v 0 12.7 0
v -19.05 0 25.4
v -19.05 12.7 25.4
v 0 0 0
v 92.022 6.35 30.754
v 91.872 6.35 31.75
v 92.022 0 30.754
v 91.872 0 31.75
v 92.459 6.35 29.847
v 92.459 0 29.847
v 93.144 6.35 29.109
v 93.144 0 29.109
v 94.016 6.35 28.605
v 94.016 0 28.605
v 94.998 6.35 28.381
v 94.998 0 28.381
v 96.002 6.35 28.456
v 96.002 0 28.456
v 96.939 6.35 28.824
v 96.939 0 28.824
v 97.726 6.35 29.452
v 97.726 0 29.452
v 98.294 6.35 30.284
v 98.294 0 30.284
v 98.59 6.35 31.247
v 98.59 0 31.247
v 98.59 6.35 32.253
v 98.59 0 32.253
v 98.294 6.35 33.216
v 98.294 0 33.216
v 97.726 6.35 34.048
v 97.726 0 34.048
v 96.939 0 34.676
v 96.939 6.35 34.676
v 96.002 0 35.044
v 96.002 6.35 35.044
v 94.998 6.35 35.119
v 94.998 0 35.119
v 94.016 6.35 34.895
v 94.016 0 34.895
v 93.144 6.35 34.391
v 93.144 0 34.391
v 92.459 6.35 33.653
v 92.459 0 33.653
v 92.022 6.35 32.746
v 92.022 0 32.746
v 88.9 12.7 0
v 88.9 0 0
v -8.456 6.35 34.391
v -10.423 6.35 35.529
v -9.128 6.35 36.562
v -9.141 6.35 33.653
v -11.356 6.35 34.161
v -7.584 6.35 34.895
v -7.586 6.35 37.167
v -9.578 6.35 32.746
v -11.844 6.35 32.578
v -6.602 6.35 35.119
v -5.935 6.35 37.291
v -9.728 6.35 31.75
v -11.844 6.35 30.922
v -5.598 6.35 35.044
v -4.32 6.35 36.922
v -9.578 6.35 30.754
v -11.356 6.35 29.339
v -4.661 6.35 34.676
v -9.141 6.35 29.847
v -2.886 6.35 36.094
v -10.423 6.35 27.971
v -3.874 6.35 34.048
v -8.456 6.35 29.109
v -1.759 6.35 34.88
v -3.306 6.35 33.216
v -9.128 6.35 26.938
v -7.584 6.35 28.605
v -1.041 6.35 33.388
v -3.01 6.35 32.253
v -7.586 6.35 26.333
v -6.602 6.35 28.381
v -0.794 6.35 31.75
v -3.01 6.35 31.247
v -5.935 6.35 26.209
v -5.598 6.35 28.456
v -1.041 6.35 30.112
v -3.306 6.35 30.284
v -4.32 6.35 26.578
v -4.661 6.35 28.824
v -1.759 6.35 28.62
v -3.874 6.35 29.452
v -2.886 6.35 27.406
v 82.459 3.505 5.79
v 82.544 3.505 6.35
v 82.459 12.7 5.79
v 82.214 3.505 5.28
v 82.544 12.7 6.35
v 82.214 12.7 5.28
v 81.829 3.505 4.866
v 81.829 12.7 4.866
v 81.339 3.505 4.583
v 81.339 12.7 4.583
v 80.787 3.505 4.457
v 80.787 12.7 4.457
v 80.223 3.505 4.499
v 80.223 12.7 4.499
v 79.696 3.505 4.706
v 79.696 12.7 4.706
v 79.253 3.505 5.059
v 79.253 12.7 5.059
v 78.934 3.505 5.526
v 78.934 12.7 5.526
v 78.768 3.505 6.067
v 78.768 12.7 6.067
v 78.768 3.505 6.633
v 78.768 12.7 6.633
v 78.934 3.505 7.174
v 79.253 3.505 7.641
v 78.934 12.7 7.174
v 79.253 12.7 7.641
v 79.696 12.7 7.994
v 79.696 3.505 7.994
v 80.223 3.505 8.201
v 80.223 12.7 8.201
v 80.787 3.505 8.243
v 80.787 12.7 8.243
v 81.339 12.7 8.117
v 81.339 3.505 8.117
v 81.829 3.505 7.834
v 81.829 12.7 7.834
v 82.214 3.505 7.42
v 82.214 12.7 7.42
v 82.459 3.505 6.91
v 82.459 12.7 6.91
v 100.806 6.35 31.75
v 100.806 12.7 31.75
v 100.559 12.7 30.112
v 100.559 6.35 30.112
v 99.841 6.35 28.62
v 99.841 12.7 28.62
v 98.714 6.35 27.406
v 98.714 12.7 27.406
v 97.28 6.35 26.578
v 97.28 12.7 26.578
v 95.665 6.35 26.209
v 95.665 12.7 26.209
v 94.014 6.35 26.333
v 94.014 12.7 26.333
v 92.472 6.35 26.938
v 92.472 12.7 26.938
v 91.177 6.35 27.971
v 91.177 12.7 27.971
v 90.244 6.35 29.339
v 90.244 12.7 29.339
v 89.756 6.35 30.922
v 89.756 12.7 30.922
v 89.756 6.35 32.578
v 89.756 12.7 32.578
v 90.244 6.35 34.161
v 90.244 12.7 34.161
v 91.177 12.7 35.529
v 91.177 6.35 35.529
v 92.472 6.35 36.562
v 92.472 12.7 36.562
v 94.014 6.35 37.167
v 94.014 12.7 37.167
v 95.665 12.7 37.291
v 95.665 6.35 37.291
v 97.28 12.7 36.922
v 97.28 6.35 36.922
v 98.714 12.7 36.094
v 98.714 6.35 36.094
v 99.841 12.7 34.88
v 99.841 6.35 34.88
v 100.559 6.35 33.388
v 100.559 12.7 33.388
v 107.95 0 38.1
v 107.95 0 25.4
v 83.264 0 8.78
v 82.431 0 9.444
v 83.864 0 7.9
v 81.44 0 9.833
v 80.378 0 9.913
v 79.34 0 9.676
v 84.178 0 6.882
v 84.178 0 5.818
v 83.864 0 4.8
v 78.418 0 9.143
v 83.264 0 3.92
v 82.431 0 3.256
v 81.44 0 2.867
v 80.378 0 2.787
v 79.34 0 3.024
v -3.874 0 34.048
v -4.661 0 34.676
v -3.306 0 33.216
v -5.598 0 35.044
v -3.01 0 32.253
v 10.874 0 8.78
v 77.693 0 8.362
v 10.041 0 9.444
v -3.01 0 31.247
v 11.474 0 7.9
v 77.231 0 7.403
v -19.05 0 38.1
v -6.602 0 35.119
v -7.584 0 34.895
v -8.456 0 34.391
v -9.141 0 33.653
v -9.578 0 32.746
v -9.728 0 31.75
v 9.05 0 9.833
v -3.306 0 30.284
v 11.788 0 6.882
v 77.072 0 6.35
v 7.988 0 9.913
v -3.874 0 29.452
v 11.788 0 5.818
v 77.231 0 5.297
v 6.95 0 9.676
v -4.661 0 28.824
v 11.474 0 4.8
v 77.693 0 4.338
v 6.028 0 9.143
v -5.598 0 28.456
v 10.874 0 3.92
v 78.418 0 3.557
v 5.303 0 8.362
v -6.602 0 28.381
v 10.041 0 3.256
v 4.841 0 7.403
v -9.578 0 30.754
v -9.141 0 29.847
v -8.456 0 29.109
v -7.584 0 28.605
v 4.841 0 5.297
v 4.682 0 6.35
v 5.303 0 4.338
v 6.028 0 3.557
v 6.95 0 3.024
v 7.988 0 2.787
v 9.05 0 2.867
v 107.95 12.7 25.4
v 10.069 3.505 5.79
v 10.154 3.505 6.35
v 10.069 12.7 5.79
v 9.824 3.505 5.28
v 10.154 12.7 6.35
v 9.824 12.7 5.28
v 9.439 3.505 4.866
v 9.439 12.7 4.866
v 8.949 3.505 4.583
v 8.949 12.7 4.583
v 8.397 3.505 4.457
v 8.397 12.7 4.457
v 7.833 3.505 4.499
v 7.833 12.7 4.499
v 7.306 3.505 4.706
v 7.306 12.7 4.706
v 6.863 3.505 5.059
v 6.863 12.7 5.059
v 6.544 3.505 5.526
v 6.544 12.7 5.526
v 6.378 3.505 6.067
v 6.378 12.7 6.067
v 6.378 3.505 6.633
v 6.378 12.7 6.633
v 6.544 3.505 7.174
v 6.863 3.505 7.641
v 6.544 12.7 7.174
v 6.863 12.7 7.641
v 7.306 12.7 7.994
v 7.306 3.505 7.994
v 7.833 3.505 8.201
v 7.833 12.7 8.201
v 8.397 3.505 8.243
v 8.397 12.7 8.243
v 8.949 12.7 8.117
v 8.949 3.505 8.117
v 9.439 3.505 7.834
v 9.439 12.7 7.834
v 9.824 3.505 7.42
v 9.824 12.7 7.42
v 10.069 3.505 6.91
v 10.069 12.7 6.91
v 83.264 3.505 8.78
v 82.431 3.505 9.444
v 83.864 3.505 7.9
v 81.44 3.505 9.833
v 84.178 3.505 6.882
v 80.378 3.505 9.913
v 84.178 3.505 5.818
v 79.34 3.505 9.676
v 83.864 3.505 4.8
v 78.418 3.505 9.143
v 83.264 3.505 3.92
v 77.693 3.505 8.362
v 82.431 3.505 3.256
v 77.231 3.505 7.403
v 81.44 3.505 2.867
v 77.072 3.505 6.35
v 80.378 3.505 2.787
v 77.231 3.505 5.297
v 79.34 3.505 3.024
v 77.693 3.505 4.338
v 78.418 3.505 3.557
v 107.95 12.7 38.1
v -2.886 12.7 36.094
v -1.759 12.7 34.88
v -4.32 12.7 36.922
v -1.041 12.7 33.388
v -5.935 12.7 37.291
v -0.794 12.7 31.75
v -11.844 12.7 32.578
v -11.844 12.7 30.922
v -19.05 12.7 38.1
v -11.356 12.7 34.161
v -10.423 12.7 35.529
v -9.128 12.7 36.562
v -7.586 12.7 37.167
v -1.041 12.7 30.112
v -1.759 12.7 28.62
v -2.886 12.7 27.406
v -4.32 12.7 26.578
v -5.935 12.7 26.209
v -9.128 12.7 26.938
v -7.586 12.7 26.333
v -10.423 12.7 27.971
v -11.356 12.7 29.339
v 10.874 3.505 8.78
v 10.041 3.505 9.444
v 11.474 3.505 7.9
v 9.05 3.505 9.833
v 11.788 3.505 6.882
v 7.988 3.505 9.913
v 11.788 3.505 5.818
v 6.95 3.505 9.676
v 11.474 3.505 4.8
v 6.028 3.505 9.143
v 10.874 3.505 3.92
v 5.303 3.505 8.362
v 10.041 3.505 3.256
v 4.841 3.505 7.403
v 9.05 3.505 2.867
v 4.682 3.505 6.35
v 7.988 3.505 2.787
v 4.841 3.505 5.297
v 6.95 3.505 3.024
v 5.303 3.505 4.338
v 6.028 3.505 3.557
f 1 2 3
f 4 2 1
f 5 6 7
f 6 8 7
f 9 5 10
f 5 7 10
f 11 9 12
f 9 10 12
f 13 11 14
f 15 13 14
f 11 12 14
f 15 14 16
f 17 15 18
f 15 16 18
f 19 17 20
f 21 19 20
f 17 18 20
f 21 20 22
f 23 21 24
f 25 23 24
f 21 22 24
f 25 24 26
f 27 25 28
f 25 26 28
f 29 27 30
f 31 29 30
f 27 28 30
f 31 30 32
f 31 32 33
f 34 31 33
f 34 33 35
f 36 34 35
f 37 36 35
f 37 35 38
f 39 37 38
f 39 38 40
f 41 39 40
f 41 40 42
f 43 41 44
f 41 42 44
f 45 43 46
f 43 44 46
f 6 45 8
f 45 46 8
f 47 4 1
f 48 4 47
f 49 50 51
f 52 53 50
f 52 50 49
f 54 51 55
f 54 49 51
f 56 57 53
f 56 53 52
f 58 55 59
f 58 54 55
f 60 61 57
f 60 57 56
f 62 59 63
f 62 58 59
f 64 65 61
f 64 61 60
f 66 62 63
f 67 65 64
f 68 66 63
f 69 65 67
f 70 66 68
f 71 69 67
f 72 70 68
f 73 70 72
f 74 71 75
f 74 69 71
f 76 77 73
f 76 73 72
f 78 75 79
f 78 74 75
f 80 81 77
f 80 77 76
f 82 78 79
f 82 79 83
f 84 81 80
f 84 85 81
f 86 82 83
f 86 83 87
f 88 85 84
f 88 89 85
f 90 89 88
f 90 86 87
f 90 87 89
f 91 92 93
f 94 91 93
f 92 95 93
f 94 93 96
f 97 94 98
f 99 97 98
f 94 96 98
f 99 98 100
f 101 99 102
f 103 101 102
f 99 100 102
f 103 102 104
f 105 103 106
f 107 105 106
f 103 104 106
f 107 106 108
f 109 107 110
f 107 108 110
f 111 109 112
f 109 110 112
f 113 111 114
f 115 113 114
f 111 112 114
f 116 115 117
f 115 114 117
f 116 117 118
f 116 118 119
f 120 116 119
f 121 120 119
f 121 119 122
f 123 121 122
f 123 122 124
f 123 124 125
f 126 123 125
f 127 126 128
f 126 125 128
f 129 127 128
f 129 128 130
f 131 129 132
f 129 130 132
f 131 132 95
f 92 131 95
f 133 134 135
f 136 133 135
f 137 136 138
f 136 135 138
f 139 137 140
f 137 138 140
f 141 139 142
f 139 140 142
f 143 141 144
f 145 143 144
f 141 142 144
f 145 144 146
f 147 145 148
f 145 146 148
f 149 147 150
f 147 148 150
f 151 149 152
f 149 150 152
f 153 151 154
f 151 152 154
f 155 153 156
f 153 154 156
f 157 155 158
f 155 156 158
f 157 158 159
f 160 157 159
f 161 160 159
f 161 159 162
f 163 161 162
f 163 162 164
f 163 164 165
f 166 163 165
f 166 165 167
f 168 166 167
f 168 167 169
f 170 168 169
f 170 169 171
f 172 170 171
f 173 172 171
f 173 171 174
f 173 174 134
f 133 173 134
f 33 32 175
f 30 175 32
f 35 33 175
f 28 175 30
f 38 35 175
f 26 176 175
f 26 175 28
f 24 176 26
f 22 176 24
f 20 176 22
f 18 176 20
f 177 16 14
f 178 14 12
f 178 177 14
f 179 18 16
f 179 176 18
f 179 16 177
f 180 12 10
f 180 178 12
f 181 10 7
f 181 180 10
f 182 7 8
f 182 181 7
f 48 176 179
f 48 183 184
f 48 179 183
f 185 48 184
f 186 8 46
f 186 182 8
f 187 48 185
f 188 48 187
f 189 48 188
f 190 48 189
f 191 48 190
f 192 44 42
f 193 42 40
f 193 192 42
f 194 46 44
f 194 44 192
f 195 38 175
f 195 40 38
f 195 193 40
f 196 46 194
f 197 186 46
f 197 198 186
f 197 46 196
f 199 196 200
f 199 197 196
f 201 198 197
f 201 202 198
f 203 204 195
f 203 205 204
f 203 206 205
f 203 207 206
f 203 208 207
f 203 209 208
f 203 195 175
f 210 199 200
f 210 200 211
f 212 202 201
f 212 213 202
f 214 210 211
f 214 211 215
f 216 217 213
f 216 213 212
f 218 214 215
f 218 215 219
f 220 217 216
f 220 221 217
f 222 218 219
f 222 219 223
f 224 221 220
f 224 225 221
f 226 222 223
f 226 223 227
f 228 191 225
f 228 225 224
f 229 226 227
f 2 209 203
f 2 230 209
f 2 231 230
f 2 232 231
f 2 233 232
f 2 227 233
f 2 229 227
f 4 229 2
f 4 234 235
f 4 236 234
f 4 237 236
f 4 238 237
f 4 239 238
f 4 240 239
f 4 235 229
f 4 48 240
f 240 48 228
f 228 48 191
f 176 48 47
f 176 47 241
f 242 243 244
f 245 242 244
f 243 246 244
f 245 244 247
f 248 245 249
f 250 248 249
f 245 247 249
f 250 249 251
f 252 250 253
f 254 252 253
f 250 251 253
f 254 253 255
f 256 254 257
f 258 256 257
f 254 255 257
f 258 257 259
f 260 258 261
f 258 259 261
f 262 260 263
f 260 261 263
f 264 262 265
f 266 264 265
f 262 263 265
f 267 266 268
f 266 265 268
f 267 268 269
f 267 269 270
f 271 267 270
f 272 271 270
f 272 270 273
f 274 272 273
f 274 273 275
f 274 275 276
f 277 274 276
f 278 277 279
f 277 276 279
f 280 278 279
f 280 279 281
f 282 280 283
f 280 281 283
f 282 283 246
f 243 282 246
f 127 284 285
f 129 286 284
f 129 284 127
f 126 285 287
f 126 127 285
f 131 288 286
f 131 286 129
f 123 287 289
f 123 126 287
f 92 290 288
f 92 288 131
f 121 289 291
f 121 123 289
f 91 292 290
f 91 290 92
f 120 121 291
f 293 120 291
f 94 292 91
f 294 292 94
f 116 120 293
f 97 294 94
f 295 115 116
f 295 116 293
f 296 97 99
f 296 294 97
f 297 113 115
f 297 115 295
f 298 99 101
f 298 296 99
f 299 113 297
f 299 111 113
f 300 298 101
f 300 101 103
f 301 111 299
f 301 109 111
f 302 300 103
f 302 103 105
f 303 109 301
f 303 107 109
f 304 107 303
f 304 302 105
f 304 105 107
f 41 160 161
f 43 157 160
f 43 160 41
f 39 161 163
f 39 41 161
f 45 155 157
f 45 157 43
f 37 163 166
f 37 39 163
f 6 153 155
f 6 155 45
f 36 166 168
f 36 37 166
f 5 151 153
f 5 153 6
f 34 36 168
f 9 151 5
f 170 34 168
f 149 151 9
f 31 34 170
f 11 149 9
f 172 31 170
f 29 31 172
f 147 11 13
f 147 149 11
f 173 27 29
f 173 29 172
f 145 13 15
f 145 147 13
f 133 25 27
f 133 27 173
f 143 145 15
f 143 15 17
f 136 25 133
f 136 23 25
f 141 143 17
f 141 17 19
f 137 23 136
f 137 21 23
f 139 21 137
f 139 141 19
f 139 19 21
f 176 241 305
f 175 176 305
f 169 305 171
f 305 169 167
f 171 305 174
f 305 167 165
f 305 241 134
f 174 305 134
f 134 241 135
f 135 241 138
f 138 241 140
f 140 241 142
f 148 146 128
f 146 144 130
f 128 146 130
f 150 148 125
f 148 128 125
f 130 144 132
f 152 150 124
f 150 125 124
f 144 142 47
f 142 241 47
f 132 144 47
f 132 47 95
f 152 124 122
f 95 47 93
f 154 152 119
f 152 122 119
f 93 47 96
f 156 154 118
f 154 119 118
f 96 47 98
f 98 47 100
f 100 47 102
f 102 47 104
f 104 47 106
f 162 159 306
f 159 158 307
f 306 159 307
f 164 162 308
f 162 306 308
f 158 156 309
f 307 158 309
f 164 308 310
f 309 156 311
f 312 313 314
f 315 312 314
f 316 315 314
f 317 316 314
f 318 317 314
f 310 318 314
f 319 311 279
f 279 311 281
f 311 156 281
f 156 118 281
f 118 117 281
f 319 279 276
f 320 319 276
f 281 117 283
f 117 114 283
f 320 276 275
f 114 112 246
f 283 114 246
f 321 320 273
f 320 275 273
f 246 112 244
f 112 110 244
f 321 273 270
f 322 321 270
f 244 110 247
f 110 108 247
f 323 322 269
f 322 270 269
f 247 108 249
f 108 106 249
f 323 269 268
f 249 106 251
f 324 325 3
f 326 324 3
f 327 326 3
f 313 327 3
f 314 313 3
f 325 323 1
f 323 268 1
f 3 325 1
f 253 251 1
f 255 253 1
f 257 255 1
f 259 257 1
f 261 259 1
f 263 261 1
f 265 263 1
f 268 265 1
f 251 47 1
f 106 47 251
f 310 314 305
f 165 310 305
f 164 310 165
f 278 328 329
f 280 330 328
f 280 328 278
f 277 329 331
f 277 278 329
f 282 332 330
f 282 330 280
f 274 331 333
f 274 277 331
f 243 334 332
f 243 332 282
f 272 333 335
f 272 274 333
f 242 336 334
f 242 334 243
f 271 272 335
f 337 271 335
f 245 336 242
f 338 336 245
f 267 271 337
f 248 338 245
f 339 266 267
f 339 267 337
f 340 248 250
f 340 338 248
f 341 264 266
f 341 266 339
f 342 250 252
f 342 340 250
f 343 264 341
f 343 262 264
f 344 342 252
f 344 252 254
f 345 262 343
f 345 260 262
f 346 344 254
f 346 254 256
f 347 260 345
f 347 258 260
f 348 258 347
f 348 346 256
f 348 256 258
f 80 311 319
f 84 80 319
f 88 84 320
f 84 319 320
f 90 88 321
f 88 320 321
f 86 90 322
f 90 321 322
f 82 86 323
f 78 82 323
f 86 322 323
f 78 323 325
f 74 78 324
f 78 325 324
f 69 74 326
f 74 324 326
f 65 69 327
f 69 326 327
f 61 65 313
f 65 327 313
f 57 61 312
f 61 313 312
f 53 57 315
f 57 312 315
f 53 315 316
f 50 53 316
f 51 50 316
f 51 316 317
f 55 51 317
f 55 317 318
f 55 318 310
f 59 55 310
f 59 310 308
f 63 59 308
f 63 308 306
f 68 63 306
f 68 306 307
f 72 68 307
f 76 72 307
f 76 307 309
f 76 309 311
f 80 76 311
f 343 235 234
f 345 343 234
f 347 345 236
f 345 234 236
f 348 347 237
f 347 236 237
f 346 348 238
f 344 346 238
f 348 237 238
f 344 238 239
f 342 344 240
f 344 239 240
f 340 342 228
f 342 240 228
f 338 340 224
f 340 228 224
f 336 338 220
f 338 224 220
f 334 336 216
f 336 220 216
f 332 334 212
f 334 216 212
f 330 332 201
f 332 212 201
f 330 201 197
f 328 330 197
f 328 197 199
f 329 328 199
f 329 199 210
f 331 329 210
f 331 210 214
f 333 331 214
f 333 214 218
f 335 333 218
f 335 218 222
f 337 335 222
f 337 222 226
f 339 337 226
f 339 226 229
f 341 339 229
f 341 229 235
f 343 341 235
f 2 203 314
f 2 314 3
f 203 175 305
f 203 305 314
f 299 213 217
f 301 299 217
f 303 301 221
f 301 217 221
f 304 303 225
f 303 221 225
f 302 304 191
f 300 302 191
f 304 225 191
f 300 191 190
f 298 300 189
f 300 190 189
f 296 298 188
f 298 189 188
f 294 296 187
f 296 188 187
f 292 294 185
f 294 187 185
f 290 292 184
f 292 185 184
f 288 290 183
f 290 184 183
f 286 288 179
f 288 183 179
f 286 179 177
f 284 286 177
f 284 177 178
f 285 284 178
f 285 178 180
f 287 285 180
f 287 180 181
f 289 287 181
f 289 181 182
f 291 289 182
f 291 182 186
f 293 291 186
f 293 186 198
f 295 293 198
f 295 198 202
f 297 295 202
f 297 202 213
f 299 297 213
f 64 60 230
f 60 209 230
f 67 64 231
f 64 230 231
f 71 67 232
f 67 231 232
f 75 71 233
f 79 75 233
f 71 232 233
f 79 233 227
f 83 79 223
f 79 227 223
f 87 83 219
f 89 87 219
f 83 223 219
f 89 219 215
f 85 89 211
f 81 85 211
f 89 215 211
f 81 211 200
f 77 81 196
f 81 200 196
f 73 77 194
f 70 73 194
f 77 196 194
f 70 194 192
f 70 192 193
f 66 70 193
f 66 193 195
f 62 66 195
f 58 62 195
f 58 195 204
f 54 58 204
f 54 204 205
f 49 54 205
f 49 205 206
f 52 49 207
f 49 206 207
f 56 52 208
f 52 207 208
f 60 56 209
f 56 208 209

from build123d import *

# Parameters (mm, degrees)
BOSS_EXTRUDE3_DEPTH                              = 12.7
CBORE_FOR_6_SOCKET_HEAD_CAP_SCREW1_D             = 3.7973
CBORE_FOR_6_SOCKET_HEAD_CAP_SCREW1_CBORE_D       = 7.14502
CBORE_FOR_6_SOCKET_HEAD_CAP_SCREW1_CBORE_DEPTH   = 3.5052
CBORE_FOR_1_4_SOCKET_HEAD_CAP_SCREW1_D           = 6.7564
CBORE_FOR_1_4_SOCKET_HEAD_CAP_SCREW1_CBORE_D     = 11.1125
CBORE_FOR_1_4_SOCKET_HEAD_CAP_SCREW1_CBORE_DEPTH = 6.35


with BuildPart() as part:
    # Sketch8 → Boss-Extrude3 (new body)
    with BuildSketch(Plane(origin=(0, 0, 0), x_dir=(1, 0, 0), z_dir=(0, 1, 0))):
        Polygon((0, 0), (88.9, 0), (107.95, -25.4), (107.95, -38.1), (-19.05, -38.1), (-19.05, -25.4), align=None)
    extrude(amount=BOSS_EXTRUDE3_DEPTH)

    # CBORE for #6 Socket Head Cap Screw1 (through all)
    with Locations(Plane(origin=(0, 0, 0), x_dir=(-1, 0, 0), z_dir=(0, -1, 0))):
        with Locations((-80.645, -6.35), (-8.255, -6.35)):
            CounterBoreHole(CBORE_FOR_6_SOCKET_HEAD_CAP_SCREW1_D / 2, CBORE_FOR_6_SOCKET_HEAD_CAP_SCREW1_CBORE_D / 2, CBORE_FOR_6_SOCKET_HEAD_CAP_SCREW1_CBORE_DEPTH)

    # CBORE for 1/4 Socket Head Cap Screw1 (through all)
    with Locations(Plane(origin=(0, 12.7, 0), x_dir=(1, 0, 0), z_dir=(0, 1, 0))):
        with Locations((-6.35, -31.75), (95.25, -31.75)):
            CounterBoreHole(CBORE_FOR_1_4_SOCKET_HEAD_CAP_SCREW1_D / 2, CBORE_FOR_1_4_SOCKET_HEAD_CAP_SCREW1_CBORE_D / 2, CBORE_FOR_1_4_SOCKET_HEAD_CAP_SCREW1_CBORE_DEPTH)


solid = part.part
